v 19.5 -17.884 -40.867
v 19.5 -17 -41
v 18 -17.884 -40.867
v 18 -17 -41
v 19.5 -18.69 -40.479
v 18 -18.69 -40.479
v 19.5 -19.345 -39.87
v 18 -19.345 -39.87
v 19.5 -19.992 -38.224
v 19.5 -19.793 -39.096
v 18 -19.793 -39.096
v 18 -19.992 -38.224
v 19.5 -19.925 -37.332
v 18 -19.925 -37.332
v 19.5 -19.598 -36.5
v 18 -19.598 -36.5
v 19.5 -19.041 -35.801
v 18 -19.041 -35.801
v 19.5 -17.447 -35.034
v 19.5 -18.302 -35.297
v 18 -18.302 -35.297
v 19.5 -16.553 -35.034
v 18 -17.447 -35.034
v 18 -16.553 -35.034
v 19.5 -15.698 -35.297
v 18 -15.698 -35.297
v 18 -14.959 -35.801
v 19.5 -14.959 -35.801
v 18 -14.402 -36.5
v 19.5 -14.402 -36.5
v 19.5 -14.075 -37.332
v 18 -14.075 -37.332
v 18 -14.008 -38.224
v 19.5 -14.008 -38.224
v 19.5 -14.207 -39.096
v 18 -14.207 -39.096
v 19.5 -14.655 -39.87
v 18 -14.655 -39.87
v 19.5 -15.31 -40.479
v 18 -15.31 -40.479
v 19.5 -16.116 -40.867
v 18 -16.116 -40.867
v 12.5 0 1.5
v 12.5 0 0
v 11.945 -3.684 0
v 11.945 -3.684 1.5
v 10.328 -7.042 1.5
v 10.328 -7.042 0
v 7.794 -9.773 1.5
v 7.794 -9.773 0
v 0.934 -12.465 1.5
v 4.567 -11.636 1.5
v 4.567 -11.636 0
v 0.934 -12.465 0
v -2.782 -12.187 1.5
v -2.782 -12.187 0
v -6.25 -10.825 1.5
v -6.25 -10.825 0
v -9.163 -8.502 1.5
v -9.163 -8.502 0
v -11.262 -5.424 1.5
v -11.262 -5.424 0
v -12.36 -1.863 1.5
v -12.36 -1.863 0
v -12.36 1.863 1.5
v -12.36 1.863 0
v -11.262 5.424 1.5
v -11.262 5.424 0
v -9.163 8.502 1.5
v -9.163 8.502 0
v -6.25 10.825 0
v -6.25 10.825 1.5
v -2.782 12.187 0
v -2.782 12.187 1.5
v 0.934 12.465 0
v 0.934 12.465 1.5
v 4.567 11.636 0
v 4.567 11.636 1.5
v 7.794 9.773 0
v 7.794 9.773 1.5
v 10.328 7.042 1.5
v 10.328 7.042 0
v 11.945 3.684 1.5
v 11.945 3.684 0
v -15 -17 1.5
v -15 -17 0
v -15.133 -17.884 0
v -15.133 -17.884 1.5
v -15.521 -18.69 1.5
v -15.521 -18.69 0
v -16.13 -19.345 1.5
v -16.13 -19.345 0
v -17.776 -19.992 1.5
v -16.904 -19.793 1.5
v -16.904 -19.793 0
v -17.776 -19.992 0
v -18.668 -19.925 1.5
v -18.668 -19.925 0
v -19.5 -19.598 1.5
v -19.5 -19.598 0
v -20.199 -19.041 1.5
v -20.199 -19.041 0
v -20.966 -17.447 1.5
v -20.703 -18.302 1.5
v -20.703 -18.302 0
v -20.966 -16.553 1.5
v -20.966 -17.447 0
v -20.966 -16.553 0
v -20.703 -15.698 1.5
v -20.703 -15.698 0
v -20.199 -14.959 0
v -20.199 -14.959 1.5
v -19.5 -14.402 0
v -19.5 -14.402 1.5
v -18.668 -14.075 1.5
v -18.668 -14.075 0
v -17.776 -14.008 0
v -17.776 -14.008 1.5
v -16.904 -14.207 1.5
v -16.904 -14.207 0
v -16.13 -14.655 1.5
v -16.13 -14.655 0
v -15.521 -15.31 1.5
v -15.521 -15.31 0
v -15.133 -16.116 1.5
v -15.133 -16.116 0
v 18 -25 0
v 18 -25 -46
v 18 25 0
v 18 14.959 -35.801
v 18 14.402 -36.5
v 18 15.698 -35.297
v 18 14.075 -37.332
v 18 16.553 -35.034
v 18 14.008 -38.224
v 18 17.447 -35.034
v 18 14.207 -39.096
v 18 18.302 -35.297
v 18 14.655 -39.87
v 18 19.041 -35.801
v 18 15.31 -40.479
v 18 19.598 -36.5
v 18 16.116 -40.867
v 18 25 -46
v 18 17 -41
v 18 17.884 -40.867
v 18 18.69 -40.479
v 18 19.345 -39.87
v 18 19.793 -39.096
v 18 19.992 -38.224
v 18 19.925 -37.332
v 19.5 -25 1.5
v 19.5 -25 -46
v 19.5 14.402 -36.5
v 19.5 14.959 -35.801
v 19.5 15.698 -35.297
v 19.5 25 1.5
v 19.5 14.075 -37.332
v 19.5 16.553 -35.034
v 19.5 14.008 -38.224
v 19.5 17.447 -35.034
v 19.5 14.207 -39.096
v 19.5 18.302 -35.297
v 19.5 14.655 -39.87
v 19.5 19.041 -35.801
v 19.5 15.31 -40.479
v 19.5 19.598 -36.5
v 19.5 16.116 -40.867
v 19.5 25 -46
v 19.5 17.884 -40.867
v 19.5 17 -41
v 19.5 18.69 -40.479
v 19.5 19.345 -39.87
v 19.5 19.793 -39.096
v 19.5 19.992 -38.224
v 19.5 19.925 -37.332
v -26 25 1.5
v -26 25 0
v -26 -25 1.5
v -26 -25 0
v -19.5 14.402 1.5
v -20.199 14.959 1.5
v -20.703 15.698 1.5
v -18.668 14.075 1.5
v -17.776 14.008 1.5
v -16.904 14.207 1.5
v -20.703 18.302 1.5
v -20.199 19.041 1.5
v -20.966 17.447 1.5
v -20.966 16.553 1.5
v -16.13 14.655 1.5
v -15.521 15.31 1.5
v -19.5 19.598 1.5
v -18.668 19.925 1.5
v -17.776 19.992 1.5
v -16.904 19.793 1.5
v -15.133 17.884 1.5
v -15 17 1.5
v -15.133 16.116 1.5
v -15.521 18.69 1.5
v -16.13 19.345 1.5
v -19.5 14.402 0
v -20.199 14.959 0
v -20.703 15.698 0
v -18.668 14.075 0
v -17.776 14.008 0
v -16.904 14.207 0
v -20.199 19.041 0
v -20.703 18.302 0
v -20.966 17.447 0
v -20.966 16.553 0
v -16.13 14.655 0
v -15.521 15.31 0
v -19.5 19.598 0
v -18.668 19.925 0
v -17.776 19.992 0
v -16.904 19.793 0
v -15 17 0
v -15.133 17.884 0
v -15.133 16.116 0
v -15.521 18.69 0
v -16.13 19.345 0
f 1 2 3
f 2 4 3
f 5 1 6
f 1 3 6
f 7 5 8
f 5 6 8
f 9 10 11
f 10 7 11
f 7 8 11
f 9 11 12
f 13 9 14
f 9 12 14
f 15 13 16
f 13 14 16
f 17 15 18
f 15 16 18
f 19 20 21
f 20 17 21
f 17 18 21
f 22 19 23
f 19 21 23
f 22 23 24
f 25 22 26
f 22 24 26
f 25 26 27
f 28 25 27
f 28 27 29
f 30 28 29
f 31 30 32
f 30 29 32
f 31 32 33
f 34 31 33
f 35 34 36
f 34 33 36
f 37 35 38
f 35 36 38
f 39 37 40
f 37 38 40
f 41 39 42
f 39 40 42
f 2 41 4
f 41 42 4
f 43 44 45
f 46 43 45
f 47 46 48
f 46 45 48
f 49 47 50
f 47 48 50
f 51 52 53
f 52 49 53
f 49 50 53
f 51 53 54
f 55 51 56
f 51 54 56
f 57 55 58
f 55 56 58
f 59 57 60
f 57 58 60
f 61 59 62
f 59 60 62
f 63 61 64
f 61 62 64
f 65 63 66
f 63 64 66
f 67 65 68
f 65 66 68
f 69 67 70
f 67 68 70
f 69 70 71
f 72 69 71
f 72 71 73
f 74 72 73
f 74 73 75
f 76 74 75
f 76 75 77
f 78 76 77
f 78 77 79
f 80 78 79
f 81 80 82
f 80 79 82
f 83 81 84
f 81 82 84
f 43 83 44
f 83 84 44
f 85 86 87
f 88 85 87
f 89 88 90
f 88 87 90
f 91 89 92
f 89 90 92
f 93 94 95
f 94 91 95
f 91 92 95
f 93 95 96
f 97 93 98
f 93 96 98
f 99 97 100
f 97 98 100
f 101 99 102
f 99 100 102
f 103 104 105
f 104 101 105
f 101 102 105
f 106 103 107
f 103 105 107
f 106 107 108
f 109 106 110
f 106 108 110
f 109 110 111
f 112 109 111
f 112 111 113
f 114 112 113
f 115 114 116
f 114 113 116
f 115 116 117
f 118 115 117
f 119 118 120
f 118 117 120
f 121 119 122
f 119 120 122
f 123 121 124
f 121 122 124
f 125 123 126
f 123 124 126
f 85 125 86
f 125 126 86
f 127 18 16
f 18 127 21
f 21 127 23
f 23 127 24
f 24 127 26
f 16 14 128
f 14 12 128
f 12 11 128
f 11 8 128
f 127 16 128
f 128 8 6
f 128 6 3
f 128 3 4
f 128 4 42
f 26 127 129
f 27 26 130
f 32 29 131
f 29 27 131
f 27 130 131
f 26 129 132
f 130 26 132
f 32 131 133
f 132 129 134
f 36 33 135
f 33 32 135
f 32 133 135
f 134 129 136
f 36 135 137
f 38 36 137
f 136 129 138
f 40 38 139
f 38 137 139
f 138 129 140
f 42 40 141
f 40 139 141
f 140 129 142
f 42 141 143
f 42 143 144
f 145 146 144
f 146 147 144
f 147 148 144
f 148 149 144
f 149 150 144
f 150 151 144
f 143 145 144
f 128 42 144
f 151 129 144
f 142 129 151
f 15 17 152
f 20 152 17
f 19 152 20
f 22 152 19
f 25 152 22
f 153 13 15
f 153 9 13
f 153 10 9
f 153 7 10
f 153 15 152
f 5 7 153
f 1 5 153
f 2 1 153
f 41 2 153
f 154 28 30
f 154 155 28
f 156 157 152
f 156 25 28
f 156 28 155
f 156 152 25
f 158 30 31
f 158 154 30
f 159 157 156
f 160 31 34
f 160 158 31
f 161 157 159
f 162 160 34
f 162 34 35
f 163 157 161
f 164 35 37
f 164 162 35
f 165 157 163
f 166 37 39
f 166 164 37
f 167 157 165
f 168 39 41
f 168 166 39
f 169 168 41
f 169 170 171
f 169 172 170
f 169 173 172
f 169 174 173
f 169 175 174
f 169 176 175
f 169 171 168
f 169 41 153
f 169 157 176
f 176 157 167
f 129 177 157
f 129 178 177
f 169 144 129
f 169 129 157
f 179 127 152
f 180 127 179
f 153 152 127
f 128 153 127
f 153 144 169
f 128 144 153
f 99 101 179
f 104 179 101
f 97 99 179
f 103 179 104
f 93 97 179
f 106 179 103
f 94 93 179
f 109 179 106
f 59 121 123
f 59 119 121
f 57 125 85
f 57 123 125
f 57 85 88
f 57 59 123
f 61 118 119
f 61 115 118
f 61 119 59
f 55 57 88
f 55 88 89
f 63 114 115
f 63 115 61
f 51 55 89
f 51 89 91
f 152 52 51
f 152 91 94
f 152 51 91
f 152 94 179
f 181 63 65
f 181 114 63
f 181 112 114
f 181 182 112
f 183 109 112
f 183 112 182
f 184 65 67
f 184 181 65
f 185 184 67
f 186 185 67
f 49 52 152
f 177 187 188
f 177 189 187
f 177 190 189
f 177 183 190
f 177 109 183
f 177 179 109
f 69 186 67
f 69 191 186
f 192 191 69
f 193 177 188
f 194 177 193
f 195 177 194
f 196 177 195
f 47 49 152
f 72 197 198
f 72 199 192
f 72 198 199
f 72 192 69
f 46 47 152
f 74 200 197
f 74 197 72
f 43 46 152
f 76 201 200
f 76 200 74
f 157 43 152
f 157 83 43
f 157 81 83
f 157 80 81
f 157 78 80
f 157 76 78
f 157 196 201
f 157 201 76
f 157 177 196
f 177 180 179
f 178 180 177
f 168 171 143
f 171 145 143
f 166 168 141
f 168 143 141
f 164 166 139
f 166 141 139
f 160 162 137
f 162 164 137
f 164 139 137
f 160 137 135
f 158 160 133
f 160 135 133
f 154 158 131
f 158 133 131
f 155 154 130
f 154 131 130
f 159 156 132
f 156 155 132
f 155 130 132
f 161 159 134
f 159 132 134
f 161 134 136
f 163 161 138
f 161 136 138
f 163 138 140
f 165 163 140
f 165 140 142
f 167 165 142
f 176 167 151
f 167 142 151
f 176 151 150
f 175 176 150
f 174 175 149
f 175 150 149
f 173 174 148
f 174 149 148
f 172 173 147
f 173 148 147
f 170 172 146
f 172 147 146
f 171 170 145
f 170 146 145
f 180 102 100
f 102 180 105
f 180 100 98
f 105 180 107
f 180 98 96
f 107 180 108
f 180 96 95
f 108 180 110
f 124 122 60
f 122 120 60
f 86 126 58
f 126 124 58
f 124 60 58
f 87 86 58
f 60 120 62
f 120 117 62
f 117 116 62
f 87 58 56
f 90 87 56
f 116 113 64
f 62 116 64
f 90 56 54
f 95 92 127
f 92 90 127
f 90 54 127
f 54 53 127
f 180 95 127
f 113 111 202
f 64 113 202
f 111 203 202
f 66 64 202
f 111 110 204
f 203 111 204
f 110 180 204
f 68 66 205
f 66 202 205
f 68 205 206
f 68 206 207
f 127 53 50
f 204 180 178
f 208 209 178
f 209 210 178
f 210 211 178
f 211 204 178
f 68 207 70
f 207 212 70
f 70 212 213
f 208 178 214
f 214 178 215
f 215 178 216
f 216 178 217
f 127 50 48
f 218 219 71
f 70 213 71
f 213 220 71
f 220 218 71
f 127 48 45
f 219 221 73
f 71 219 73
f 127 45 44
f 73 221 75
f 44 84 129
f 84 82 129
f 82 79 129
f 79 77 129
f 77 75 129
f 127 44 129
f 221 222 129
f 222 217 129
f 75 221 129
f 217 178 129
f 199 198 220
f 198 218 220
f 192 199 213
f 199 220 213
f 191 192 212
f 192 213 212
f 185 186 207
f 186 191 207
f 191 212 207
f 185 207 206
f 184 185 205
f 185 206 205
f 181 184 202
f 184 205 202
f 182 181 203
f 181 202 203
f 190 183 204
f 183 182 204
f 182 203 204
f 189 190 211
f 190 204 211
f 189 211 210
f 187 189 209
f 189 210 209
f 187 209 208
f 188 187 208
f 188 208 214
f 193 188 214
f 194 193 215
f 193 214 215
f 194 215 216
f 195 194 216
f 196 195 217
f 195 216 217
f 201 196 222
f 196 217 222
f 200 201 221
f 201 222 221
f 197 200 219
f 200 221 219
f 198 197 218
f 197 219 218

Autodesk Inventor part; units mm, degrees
ref_plane "YZ Plane" through (0, 0, 0) normal (1, 0, 0) x (0, 1, 0)
ref_plane "XZ Plane" through (0, 0, 0) normal (0, 1, 0) x (-1, 0, 0)
ref_plane "XY Plane" through (0, 0, 0) normal (0, 0, 1) x (1, 0, 0)
sketch "Esboço1" plane through (0, 0, 0) normal (0, 0, 1) x (1, 0, 0)
  circle A0 centre (0, 0) radius 12.5
  line L0 (0, 0) -> (18, 0) construction
  line L1 (0, 0) -> (-26, 0) construction
  line L2 (0, 0) -> (0, 25) construction
  line L3 (0, 0) -> (0, -25) construction
  line L4 (-26, 25) -> (18, 25)
  line L5 (18, 25) -> (18, -25)
  line L6 (18, -25) -> (-26, -25)
  line L7 (-26, -25) -> (-26, 25)
  line L8 (-26, 25) -> (-18, 25) construction
  line L9 (-18, 25) -> (-18, 17) construction
  circle A1 centre (-18, 17) radius 3
  line L10 (-26, -25) -> (-18, -25) construction
  line L11 (-18, -25) -> (-18, -17) construction
  circle A2 centre (-18, -17) radius 3
  dimension "d0" = 25
  dimension "d1" = 18
  dimension "d2" = 26
  dimension "d3" = 25
  dimension "d4" = 25
  dimension "d5" = 8
  dimension "d6" = 8
  dimension "d7" = 6
  dimension "d8" = 8
  dimension "d9" = 8
  dimension "d10" = 6
extrude "Extrusão1" add sketch "Esboço1" along normal blind 1.5
sketch "Esboço2" plane through (18, -25, 0) normal (1, 0, 0) x (0, 0, -1)
  line L0 (-1.5, 50) -> (46, 50)
  line L1 (46, 50) -> (46, 0)
  line L2 (46, 0) -> (-1.5, 0)
  line L3 (-1.5, 0) -> (-1.5, 50)
  line L4 (46, 50) -> (38, 50) construction
  line L5 (38, 50) -> (38, 42) construction
  circle A0 centre (38, 42) radius 3
  line L6 (46, 0) -> (38, 0) construction
  line L7 (38, 0) -> (38, 8) construction
  circle A1 centre (38, 8) radius 3
  point P0 (0, 25)
  dimension "d13" = 47.5
  dimension "d14" = 50
  dimension "d15" = 8
  dimension "d16" = 8
  dimension "d17" = 6
  dimension "d18" = 8
  dimension "d19" = 8
  dimension "d20" = 6
extrude "Extrusão2" add sketch "Esboço2" along normal blind 1.5
properties part number "ks dianteiro F" material "Aço cromado"
